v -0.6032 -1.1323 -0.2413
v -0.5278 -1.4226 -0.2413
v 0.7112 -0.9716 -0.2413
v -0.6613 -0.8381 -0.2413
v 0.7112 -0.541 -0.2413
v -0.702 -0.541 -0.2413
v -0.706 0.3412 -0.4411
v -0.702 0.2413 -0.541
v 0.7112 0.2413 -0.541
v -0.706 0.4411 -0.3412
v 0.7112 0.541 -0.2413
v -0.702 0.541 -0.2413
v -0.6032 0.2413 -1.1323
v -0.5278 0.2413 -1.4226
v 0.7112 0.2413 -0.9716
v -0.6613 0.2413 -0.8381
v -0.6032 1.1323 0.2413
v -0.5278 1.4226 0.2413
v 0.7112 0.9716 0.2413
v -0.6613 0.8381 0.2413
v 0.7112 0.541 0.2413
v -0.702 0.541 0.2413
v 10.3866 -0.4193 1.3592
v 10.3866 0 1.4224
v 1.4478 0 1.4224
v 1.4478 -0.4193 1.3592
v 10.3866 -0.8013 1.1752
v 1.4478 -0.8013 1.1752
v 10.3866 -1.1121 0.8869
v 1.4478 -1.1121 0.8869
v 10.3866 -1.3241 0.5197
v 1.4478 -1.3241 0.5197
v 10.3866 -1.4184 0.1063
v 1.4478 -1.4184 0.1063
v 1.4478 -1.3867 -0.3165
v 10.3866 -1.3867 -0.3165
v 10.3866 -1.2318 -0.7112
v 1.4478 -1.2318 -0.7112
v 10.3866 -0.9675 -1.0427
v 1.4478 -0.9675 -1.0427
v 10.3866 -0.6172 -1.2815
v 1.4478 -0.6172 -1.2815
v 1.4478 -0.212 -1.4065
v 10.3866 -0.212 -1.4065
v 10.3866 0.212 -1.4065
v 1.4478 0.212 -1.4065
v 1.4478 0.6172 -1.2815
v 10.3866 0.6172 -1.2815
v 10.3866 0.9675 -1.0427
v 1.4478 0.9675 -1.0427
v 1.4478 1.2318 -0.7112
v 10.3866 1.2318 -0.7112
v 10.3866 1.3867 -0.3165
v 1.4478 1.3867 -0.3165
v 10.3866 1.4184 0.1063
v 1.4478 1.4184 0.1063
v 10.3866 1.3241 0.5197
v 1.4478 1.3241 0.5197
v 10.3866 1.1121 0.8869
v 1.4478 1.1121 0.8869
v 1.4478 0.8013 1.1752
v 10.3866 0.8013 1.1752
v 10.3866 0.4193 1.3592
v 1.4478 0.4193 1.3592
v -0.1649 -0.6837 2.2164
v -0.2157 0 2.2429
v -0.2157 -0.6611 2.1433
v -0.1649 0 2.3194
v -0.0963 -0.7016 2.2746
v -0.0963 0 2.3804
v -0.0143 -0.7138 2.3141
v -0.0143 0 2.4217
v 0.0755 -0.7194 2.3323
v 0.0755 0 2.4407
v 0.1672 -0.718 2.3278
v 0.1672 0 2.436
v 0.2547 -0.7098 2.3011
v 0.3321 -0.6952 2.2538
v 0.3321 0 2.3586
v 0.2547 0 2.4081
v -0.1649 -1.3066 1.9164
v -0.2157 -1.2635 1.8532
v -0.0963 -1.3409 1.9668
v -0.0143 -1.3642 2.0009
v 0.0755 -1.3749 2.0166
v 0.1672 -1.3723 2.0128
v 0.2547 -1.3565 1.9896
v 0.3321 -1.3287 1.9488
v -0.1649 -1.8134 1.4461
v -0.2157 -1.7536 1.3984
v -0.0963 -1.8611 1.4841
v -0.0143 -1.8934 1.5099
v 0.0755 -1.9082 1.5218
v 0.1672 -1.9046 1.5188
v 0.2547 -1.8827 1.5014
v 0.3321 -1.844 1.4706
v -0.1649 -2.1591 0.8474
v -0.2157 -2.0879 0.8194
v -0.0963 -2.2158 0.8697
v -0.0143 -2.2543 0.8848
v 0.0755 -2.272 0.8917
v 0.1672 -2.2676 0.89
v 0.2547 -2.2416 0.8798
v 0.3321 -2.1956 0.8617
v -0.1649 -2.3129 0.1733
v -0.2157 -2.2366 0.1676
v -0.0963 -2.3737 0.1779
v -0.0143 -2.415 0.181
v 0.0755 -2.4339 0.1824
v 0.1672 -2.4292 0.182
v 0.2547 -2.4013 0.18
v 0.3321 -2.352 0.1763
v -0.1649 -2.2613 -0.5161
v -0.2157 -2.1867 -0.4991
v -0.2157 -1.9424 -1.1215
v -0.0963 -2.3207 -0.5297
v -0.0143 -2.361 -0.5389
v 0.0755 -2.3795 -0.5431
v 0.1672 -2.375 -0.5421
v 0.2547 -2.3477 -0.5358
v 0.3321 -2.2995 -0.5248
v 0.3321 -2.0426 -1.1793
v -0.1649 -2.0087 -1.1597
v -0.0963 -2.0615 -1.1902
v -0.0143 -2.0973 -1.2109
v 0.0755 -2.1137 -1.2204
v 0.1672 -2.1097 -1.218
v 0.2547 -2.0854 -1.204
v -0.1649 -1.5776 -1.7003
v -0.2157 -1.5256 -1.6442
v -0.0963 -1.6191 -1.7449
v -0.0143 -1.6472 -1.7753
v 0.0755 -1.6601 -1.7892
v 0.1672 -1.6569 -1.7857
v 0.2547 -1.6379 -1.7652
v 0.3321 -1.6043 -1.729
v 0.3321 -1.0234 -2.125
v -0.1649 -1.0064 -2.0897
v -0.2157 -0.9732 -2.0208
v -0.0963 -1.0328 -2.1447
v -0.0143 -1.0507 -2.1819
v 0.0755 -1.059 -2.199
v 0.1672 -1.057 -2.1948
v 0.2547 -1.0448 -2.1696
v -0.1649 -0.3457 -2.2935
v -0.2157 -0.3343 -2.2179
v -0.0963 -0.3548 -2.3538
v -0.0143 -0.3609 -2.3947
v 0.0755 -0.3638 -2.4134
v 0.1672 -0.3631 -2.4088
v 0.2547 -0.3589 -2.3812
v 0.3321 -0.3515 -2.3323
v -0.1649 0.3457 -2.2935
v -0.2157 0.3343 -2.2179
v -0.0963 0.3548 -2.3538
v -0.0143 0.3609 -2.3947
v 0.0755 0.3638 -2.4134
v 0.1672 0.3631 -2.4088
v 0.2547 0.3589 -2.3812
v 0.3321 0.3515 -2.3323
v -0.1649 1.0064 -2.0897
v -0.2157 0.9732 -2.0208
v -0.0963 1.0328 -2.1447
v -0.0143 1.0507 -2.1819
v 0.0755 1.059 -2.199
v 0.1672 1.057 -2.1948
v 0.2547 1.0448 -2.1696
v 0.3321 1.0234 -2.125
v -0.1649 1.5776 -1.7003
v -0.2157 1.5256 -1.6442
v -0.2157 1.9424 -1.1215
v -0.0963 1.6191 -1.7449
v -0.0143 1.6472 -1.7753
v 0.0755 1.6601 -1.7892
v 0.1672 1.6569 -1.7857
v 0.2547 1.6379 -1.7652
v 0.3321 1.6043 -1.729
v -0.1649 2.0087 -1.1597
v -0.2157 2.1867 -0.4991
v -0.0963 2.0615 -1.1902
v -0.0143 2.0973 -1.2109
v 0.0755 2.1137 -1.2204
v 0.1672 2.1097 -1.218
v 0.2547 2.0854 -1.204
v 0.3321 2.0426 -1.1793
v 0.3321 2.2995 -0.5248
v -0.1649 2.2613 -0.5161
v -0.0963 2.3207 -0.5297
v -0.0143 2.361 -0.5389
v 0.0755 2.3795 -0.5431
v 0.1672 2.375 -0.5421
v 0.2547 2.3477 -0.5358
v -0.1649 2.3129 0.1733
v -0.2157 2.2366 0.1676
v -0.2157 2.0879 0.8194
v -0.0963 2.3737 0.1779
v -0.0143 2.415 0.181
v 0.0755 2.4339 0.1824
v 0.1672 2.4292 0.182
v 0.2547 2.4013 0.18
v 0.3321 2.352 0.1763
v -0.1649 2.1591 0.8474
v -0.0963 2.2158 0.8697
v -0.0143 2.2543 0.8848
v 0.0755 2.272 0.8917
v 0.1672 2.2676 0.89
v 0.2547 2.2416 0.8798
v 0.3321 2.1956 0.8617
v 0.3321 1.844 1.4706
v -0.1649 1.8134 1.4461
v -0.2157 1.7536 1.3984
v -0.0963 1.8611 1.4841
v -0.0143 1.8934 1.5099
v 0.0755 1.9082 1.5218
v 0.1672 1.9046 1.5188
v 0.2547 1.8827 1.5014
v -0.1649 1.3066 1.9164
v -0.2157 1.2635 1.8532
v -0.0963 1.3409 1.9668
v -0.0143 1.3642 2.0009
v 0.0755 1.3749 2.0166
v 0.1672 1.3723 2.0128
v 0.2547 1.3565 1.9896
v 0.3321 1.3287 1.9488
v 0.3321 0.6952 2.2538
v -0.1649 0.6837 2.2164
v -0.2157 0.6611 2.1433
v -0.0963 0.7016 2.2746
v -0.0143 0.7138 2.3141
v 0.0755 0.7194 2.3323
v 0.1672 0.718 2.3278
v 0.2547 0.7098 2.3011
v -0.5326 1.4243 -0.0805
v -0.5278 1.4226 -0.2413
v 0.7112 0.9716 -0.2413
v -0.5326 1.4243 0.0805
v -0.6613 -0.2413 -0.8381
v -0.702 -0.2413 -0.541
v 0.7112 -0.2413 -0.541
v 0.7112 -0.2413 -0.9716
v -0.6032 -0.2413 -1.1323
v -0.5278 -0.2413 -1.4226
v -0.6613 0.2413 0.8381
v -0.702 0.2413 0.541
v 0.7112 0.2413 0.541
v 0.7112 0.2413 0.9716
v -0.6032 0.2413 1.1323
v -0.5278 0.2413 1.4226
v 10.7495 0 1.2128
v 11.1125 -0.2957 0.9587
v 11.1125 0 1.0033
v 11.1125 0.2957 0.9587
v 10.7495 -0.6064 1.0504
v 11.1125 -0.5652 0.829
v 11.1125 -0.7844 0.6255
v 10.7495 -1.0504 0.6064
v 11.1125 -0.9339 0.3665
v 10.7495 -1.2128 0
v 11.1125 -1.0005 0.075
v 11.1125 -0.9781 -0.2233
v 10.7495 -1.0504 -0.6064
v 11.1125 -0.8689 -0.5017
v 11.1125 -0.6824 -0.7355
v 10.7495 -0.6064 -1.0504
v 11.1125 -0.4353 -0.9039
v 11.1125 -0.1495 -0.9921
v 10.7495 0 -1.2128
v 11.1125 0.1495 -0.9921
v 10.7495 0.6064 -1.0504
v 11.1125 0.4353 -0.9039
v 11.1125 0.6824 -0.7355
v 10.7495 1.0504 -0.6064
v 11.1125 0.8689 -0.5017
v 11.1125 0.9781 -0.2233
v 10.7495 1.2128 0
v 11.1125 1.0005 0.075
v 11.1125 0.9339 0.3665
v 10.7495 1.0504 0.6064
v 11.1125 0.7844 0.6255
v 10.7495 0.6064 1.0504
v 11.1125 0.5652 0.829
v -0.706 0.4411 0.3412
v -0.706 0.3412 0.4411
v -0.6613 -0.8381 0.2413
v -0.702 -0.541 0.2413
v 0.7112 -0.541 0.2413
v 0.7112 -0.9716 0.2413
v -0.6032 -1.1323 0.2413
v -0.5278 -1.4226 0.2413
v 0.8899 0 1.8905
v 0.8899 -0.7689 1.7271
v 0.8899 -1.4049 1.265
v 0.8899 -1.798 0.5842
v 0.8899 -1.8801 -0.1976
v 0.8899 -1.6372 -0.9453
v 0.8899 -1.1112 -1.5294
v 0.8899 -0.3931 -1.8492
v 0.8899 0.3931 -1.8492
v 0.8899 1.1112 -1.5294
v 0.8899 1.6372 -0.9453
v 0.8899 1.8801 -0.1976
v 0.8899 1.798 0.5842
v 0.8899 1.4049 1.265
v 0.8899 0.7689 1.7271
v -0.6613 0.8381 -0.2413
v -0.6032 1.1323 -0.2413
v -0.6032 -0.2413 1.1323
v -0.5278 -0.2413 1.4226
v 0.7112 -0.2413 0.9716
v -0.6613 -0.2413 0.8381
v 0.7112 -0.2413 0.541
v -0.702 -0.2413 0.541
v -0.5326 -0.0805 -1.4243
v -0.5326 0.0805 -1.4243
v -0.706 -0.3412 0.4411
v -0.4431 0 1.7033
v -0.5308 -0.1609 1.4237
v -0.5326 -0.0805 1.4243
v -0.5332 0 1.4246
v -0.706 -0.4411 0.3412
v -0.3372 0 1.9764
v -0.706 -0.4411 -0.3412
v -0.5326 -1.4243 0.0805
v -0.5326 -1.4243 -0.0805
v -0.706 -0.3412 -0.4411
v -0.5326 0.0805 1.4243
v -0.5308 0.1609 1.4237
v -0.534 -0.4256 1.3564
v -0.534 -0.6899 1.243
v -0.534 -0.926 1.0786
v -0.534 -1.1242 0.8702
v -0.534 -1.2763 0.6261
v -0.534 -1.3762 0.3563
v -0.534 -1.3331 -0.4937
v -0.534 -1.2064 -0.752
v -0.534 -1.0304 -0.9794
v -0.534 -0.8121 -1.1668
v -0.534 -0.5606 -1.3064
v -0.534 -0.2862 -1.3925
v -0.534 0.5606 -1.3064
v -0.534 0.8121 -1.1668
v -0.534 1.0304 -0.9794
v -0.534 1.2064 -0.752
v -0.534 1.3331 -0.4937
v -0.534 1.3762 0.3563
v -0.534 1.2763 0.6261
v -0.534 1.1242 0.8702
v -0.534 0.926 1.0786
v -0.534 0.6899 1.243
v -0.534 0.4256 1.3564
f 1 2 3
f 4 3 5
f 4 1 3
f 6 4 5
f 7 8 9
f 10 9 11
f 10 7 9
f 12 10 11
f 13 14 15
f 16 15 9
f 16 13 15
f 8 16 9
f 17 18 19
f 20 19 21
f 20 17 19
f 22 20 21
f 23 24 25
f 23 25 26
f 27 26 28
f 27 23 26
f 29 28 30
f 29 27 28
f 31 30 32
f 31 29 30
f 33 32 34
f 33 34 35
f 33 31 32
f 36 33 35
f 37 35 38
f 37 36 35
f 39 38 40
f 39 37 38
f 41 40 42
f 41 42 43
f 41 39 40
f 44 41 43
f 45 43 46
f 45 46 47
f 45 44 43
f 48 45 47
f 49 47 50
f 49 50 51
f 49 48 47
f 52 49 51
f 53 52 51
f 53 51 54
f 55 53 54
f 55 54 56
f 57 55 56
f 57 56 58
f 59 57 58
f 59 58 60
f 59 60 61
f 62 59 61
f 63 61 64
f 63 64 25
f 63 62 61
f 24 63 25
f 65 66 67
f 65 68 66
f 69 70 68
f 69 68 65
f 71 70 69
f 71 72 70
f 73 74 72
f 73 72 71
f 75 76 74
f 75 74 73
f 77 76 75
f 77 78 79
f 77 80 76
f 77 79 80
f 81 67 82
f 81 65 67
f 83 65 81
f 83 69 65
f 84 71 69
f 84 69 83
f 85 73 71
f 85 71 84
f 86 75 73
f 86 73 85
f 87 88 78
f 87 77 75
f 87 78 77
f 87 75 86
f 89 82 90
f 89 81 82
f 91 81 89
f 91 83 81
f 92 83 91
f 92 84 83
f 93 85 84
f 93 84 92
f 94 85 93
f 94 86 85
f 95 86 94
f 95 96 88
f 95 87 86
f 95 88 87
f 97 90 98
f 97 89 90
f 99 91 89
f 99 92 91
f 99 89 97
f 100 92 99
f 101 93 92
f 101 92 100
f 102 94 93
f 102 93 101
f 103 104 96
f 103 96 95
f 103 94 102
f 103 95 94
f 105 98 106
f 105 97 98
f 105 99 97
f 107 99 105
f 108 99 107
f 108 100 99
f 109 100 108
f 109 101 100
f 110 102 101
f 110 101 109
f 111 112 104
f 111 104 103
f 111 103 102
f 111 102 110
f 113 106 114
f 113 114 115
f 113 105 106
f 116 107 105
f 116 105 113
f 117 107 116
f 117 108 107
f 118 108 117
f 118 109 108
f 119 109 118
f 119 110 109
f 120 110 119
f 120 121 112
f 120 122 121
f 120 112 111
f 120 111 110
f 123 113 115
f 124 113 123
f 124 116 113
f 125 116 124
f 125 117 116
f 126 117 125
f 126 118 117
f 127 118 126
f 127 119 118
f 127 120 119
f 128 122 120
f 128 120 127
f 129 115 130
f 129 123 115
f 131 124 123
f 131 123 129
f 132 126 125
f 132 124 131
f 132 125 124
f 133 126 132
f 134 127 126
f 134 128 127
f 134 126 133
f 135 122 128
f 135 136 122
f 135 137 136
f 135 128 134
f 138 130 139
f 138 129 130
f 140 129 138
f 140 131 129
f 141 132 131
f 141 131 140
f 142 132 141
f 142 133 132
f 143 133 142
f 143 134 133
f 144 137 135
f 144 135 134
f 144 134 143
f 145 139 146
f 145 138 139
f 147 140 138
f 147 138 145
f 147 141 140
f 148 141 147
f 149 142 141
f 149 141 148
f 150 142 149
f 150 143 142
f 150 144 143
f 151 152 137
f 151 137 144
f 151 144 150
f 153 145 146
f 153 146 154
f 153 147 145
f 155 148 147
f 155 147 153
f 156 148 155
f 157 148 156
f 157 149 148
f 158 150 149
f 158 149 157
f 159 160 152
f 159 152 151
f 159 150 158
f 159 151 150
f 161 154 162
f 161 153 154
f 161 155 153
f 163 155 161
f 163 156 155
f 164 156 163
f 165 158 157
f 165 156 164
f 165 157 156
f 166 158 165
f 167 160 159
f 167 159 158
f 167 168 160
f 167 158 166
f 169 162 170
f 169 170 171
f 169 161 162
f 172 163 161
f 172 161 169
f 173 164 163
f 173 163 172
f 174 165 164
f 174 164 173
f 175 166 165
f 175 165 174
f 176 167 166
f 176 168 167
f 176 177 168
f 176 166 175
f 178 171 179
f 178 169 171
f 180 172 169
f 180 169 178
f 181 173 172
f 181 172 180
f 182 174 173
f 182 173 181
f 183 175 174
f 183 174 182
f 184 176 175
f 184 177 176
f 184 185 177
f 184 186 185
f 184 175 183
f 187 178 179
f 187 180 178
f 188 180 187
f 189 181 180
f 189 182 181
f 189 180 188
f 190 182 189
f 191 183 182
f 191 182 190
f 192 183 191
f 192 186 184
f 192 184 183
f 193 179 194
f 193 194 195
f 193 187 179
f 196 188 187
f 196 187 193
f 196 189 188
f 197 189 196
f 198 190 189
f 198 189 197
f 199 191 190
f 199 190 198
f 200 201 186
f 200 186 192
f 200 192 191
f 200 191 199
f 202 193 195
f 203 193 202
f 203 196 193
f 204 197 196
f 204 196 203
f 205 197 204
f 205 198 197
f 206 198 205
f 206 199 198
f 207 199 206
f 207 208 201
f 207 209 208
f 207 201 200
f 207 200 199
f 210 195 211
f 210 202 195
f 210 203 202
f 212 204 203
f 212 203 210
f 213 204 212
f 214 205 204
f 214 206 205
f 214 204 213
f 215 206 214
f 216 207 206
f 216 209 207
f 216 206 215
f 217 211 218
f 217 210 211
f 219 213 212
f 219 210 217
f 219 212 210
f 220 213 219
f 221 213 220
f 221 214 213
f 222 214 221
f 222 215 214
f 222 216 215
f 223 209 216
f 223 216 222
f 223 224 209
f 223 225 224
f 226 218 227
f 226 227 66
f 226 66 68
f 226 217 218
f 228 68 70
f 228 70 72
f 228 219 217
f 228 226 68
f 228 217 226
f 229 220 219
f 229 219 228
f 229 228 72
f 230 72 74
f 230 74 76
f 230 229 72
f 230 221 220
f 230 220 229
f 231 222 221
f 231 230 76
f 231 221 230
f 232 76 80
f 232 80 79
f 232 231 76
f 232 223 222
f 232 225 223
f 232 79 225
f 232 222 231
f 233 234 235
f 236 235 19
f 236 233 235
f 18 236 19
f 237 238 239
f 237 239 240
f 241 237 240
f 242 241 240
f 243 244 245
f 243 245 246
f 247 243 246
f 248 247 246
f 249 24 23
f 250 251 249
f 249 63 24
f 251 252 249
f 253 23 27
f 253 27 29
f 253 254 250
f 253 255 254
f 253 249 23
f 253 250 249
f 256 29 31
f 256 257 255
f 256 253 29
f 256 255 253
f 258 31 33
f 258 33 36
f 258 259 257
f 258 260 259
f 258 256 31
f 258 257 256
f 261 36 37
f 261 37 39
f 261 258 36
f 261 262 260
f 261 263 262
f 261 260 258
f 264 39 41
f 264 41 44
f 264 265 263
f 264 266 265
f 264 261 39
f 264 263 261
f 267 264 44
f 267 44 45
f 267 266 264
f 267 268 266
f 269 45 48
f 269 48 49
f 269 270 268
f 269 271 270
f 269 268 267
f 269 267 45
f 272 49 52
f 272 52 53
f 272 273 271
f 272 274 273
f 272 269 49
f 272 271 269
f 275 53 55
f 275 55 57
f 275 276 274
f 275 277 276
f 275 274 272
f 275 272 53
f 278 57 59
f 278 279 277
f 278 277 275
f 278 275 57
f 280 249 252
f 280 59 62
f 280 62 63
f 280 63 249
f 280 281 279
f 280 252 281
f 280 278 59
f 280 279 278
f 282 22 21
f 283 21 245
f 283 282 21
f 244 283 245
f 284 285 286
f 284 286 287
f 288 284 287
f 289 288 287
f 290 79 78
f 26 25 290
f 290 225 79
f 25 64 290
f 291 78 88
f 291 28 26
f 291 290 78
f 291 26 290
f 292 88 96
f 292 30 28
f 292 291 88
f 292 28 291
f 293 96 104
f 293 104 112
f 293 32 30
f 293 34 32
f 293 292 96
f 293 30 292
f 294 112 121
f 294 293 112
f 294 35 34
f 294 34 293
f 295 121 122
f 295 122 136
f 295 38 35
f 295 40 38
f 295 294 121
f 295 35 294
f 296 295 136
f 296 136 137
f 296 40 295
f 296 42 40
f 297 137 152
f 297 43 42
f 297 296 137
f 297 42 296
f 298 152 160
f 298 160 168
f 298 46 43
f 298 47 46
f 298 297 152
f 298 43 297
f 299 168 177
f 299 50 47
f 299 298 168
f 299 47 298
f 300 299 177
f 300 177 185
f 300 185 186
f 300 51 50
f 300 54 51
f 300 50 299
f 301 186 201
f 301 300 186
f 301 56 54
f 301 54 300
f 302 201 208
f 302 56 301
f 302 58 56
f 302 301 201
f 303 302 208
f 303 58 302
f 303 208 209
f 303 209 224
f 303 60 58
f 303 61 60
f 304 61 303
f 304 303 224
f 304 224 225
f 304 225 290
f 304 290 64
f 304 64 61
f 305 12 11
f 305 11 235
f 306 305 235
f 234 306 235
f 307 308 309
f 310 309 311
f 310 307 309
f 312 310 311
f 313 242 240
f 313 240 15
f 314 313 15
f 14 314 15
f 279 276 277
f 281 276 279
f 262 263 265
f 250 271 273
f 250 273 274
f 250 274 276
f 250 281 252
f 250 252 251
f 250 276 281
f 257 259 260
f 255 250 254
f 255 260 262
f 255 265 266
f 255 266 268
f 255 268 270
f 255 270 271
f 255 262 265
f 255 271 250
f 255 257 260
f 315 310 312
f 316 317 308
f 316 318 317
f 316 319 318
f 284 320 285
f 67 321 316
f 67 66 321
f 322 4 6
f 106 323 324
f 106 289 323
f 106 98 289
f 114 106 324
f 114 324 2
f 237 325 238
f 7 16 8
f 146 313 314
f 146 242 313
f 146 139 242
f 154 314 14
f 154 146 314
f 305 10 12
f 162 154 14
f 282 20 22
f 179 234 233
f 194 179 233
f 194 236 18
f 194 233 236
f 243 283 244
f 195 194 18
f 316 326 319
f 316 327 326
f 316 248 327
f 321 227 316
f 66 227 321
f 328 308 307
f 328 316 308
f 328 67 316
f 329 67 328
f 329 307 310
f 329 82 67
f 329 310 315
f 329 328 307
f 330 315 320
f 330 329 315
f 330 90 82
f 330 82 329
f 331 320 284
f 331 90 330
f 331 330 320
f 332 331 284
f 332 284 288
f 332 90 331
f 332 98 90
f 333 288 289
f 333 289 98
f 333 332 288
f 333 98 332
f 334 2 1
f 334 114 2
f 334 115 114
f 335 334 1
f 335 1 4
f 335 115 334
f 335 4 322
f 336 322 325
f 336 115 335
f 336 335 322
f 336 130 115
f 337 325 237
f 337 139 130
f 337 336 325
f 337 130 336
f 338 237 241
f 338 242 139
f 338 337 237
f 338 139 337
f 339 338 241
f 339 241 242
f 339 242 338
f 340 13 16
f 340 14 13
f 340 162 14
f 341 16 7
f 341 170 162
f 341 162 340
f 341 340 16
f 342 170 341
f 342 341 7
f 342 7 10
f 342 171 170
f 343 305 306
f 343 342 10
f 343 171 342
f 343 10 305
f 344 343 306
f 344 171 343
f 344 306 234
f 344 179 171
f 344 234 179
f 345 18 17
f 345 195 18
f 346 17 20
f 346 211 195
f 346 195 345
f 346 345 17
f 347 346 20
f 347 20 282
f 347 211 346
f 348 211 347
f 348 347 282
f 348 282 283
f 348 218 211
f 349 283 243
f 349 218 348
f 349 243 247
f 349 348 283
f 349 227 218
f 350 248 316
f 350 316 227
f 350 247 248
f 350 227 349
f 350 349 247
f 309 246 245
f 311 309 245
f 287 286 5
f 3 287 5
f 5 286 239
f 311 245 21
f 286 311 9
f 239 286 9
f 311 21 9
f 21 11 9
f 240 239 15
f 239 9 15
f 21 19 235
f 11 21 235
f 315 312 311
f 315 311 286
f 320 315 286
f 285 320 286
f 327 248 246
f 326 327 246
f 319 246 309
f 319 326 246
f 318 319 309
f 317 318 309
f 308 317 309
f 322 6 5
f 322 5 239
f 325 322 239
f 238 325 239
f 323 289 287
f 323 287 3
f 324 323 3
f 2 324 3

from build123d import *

# Parameters (mm, degrees)
CUT_EXTRUDE3_DEPTH         = 1.4478
DRAFT1_ANGLE               = -20
RECESSI_CUT_EXTRUDE5_DEPTH = 1.4478


with BuildPart() as part:
    # Sketch1 → base-Revolve (revolve)
    with BuildSketch(Plane.XY, mode=Mode.PRIVATE) as base_revolve_sk:
        with BuildLine():
            Line((0.33207054, 2.358608179), (1.4478, 1.4224))
            Line((1.4478, 1.4224), (11.1125, 1.4224))
            Line((11.1125, 1.4224), (11.1125, 0))
            Line((11.1125, 0), (0, 0))
            Line((0, 0), (-0.7366, 0))
            ThreePointArc((-0.7366, 0), (-0.604667324, 1.151304479), (-0.215709527, 2.242917995))
            ThreePointArc((-0.215709527, 2.242917995), (0.030014098, 2.434127878), (0.33207054, 2.358608179))
        make_face()
    revolve(base_revolve_sk.sketch.rotate(Axis((0, 0, 0), (1, 0, 0)), 90), axis=Axis((0, 0, 0), (1, 0, 0)))

    # Sketch4 → Cut-Extrude3 (cut)
    with BuildSketch(Plane(origin=(-0.7366, 0, 0), x_dir=(0, 0, -1), z_dir=(1, 0, 0))):
        Polygon((0.2413, 1.4986), (-0.2413, 1.4986), (-0.2413, 0.2413), (-1.4986, 0.2413), (-1.4986, -0.2413), (-0.2413, -0.2413), (-0.2413, -1.4986), (0.2413, -1.4986), (0.2413, -0.2413), (1.4986, -0.2413), (1.4986, 0.2413), (0.2413, 0.2413), align=None)
    extrude(amount=CUT_EXTRUDE3_DEPTH, mode=Mode.SUBTRACT)

    # Draft1
    draft1_faces = [part.faces().sort_by_distance(p)[0] for p in [
        (0.101115896, 0, -1.4986),
        (0.101115896, -1.4986, 0),
        (0.101115896, 0, 1.4986),
        (0.101115896, 1.4986, 0),
    ]]
    draft(draft1_faces, Plane(origin=(-0.7366, 0, 0), x_dir=(0, 0, 1), z_dir=(1, 0, 0)), DRAFT1_ANGLE)

    # Sketch5 → recessI_Cut-Extrude5 (cut)
    with BuildSketch(Plane.ZY.offset(0.7366)):
        Polygon((0.2413, 0.54102), (0.54102, 0.2413), (0.2413, 0.2413), align=None)
        Polygon((-0.2413, 0.2413), (-0.54102, 0.2413), (-0.2413, 0.54102), align=None)
        Polygon((-0.2413, -0.54102), (-0.54102, -0.2413), (-0.2413, -0.2413), align=None)
        Polygon((0.2413, -0.2413), (0.54102, -0.2413), (0.2413, -0.54102), align=None)
    extrude(amount=-RECESSI_CUT_EXTRUDE5_DEPTH, mode=Mode.SUBTRACT)

    # Sketch8 → point_Cut-Revolve1 (revolve, cut)
    with BuildSketch(Plane.XY, mode=Mode.PRIVATE) as point_cut_revolve1_sk:
        Polygon((11.1125, 0), (11.6205, 0), (11.6205, 1.9304), (10.386597507, 1.9304), (10.386597507, 1.4224), (11.1125, 1.0033), align=None)
    revolve(point_cut_revolve1_sk.sketch.rotate(Axis((0, 0, 0), (1, 0, 0)), 90), axis=Axis((0, 0, 0), (1, 0, 0)), mode=Mode.SUBTRACT)


solid = part.part
